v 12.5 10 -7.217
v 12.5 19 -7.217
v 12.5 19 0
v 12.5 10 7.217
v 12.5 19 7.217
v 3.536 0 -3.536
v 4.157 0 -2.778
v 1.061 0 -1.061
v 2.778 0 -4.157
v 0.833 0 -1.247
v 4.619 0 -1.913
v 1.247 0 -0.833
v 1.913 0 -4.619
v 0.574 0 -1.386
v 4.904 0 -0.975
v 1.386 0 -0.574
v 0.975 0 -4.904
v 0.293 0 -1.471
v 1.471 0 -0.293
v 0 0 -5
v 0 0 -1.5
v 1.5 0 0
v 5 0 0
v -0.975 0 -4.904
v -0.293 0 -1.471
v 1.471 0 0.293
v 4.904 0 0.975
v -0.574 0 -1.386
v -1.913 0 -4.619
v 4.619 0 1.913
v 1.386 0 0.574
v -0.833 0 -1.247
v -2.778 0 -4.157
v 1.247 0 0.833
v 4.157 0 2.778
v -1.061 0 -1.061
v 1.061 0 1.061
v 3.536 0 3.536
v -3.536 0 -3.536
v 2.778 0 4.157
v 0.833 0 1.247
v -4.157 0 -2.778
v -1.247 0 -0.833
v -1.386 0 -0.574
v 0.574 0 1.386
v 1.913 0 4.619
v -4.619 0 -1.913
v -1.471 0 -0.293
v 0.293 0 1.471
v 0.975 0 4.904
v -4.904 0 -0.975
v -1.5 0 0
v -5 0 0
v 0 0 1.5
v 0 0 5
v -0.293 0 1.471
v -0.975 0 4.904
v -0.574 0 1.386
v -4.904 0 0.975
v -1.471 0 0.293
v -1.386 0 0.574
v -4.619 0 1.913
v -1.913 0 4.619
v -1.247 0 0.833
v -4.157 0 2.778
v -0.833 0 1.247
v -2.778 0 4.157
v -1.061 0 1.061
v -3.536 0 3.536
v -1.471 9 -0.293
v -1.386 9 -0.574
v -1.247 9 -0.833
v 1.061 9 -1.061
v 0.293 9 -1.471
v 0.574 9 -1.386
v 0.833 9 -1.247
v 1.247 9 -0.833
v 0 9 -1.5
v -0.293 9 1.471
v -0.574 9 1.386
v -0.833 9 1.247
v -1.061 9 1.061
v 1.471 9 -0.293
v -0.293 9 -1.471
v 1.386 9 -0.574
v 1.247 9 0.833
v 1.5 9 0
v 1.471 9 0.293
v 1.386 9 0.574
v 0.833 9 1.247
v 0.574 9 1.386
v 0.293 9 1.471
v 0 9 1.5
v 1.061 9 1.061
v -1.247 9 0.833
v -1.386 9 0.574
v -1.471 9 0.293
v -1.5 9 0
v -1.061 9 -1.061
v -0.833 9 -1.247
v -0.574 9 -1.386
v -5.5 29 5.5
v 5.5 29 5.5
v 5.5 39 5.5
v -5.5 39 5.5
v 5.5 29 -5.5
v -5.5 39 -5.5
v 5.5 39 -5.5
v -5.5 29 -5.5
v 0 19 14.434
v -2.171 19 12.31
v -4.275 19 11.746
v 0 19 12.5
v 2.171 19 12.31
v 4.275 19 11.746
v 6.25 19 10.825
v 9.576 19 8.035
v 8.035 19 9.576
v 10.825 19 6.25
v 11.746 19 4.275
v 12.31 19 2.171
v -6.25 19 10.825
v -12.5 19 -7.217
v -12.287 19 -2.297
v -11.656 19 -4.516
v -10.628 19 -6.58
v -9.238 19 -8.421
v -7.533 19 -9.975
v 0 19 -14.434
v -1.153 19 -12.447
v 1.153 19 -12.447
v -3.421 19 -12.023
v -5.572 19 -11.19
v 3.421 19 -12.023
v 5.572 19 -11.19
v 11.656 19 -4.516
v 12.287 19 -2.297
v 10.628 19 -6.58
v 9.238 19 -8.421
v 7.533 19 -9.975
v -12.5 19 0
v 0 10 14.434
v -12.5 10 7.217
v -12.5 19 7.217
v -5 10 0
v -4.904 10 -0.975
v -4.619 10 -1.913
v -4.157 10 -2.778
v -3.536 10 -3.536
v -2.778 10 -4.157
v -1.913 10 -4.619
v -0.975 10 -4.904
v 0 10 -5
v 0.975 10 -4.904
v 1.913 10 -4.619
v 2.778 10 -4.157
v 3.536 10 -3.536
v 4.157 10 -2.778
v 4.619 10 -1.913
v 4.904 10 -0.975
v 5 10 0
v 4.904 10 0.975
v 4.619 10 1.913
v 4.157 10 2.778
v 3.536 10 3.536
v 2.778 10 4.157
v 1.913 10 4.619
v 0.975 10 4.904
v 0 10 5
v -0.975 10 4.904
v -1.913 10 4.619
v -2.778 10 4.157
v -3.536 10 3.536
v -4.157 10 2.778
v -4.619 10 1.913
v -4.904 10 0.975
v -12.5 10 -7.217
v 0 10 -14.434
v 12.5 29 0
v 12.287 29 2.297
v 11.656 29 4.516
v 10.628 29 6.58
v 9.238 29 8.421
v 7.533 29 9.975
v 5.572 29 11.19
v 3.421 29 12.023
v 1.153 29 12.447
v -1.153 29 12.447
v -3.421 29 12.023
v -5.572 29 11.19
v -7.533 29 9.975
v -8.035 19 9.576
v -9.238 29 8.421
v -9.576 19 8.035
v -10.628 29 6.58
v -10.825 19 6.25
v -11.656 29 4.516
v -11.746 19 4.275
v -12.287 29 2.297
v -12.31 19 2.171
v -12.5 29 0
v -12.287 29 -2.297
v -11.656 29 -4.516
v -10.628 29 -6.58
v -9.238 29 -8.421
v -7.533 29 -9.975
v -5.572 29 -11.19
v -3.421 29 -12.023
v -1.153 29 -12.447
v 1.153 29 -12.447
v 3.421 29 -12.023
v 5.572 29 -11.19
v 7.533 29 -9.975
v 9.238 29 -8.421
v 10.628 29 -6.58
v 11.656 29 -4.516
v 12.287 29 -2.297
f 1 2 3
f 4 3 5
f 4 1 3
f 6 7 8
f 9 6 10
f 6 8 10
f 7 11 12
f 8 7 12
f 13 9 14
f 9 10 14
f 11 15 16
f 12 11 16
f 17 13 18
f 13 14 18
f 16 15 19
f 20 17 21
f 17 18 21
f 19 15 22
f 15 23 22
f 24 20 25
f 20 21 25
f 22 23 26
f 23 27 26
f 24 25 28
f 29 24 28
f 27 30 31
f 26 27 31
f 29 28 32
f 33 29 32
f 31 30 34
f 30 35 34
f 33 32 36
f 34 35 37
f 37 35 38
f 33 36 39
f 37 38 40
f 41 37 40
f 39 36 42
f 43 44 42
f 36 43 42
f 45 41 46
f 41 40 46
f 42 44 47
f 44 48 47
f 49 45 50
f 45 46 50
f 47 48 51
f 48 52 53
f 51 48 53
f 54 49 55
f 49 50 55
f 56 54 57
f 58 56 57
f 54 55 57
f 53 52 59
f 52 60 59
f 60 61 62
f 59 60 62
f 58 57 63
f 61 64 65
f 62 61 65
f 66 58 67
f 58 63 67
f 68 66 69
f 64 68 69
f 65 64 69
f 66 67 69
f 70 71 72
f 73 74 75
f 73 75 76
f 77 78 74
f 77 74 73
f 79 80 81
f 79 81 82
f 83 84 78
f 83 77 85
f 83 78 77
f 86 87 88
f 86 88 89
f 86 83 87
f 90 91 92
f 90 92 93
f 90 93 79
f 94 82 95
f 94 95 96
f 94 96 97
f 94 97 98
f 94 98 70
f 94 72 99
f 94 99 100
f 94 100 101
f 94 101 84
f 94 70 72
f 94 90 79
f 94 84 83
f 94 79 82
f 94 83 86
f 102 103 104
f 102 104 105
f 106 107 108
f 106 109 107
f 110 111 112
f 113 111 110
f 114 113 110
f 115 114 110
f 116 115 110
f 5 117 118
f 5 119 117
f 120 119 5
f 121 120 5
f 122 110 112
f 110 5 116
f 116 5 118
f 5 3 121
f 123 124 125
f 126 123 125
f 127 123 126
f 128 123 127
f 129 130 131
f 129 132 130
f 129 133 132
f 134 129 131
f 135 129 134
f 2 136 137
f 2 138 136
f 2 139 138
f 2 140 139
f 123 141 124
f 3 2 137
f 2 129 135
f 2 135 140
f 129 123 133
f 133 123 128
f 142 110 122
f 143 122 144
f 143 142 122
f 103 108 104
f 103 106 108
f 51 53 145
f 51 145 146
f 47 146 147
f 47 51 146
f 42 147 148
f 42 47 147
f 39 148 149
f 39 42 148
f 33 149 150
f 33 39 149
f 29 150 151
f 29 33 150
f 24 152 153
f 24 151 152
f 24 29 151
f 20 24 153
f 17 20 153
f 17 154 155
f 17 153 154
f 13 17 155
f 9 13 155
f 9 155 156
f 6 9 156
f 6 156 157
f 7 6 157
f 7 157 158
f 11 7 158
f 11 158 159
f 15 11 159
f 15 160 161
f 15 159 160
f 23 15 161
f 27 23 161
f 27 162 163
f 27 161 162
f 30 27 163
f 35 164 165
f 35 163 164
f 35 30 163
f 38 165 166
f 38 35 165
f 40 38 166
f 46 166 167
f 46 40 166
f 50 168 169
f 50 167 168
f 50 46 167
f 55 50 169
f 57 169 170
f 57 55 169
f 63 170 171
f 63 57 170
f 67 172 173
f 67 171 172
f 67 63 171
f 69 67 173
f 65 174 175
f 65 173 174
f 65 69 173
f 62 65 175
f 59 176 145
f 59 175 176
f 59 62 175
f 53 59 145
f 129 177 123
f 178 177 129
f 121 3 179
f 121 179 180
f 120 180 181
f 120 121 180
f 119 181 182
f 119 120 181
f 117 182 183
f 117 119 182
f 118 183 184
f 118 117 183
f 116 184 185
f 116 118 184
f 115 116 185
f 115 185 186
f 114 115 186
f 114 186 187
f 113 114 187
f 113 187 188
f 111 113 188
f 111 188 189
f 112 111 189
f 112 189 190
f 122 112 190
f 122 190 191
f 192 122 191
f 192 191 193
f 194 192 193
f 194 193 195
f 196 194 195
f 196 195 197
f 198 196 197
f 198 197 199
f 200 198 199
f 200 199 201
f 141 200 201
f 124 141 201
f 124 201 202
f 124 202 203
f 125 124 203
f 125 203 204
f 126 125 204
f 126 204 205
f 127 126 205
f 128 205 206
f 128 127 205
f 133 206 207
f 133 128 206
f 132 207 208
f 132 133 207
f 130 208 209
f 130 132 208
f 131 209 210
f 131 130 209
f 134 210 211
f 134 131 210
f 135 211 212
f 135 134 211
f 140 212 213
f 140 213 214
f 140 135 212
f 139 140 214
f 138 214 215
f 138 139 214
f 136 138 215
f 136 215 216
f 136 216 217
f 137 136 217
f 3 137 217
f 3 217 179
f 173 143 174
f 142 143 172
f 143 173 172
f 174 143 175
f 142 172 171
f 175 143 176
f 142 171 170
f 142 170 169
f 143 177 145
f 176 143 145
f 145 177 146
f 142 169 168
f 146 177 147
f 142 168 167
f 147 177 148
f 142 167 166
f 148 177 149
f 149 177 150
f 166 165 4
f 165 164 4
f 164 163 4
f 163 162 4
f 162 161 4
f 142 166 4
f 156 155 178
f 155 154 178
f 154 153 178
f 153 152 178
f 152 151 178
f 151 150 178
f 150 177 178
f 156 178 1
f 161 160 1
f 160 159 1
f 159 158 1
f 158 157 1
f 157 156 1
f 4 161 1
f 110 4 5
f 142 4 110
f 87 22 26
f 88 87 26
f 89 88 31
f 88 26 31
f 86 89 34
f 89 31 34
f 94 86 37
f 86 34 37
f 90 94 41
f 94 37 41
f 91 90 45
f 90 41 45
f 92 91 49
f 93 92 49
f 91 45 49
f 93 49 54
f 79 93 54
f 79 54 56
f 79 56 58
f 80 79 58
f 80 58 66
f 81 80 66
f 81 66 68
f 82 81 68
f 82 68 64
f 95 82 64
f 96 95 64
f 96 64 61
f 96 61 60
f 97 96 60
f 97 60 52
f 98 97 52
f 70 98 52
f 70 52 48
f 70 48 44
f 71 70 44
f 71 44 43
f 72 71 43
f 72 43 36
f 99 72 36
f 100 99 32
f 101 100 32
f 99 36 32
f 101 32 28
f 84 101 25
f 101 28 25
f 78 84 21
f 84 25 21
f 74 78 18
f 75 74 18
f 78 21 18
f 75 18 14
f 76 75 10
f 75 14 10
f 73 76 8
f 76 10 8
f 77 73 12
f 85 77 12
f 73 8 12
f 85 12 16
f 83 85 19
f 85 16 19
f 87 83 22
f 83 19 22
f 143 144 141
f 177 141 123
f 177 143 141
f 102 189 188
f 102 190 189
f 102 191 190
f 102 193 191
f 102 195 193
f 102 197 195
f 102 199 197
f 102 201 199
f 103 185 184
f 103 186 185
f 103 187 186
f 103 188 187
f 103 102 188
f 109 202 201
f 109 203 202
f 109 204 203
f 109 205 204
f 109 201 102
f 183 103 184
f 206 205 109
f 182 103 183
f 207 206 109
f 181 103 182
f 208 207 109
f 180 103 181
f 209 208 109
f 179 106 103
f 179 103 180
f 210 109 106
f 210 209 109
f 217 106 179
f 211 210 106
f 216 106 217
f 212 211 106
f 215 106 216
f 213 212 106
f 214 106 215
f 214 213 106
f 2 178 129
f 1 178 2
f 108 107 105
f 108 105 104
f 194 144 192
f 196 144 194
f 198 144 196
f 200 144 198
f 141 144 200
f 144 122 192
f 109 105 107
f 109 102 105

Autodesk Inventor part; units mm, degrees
ref_plane "XZ Plane" through (0, 0, 0) normal (0, 1, 0) x (-1, 0, 0)
ref_plane "XY Plane" through (0, 0, 0) normal (0, 0, 1) x (1, 0, 0)
sketch "Sketch2" plane through (0, 0, 0) normal (0, 1, 0) x (-1, 0, 0)
  circle A0 centre (0, 0) radius 5
  dimension "d0" = 10
extrude "Extrusion1" add sketch "Sketch2" along normal blind 10
sketch "Sketch3" plane through (0, 10, 0) normal (0, 1, 0) x (1, 0, 0)
  line L0 (0, -14.4338) -> (-12.5, -7.2169)
  line L1 (-12.5, -7.2169) -> (-12.5, 7.2169)
  line L2 (-12.5, 7.2169) -> (0, 14.4338)
  line L3 (0, 14.4338) -> (12.5, 7.2169)
  line L4 (12.5, 7.2169) -> (12.5, -7.2169)
  line L5 (12.5, -7.2169) -> (0, -14.4338)
  point P0 (0, 0)
  point P1 (0, 0)
  dimension "d14" = 25
extrude "Extrusion2" add sketch "Sketch3" along normal blind 9
sketch "Sketch4" plane through (0, 19, 0) normal (0, 1, 0) x (1, 0, 0)
  circle A0 centre (0, 0) radius 12.5
  line L0 (-12.5, -7.2169) -> (0, -14.4338) projected
extrude "Extrusion3" add sketch "Sketch4" along normal blind 10
sketch "Sketch5" plane through (0, 29, 0) normal (0, 1, 0) x (1, 0, 0)
  line L0 (5.5, -5.5) -> (-5.5, -5.5)
  line L1 (-5.5, -5.5) -> (-5.5, 5.5)
  line L2 (-5.5, 5.5) -> (5.5, 5.5)
  line L3 (5.5, 5.5) -> (5.5, -5.5)
  line L4 (5.5, -5.5) -> (-5.5, 5.5) construction
  line L5 (-5.5, -5.5) -> (5.5, 5.5) construction
  point P0 (0, 0)
  dimension "d7" = 11
  dimension "d8" = 11
extrude "Extrusion4" add sketch "Sketch5" along normal blind 10
thread "Thread1" size "1/8" designation "1/8 - 27 NPT" standard "NPT for PVC Pipe and Fitting" length 9.967
sketch "Sketch8" plane through (0, 0, 0) normal (0, -1, 0) x (1, 0, 0)
  circle A0 centre (0, 0) radius 1.5
  dimension "d24" = 3
extrude "Extrusion7" cut sketch "Sketch8" against normal blind 9
ref_plane "Work Plane1" through (0, 19, 0) normal (0.866, 0, 0.5) x (0, 1, 0)
equation "\"d8\" = d7"
properties part number "PressureSensor" material "Steel, Carbon"
